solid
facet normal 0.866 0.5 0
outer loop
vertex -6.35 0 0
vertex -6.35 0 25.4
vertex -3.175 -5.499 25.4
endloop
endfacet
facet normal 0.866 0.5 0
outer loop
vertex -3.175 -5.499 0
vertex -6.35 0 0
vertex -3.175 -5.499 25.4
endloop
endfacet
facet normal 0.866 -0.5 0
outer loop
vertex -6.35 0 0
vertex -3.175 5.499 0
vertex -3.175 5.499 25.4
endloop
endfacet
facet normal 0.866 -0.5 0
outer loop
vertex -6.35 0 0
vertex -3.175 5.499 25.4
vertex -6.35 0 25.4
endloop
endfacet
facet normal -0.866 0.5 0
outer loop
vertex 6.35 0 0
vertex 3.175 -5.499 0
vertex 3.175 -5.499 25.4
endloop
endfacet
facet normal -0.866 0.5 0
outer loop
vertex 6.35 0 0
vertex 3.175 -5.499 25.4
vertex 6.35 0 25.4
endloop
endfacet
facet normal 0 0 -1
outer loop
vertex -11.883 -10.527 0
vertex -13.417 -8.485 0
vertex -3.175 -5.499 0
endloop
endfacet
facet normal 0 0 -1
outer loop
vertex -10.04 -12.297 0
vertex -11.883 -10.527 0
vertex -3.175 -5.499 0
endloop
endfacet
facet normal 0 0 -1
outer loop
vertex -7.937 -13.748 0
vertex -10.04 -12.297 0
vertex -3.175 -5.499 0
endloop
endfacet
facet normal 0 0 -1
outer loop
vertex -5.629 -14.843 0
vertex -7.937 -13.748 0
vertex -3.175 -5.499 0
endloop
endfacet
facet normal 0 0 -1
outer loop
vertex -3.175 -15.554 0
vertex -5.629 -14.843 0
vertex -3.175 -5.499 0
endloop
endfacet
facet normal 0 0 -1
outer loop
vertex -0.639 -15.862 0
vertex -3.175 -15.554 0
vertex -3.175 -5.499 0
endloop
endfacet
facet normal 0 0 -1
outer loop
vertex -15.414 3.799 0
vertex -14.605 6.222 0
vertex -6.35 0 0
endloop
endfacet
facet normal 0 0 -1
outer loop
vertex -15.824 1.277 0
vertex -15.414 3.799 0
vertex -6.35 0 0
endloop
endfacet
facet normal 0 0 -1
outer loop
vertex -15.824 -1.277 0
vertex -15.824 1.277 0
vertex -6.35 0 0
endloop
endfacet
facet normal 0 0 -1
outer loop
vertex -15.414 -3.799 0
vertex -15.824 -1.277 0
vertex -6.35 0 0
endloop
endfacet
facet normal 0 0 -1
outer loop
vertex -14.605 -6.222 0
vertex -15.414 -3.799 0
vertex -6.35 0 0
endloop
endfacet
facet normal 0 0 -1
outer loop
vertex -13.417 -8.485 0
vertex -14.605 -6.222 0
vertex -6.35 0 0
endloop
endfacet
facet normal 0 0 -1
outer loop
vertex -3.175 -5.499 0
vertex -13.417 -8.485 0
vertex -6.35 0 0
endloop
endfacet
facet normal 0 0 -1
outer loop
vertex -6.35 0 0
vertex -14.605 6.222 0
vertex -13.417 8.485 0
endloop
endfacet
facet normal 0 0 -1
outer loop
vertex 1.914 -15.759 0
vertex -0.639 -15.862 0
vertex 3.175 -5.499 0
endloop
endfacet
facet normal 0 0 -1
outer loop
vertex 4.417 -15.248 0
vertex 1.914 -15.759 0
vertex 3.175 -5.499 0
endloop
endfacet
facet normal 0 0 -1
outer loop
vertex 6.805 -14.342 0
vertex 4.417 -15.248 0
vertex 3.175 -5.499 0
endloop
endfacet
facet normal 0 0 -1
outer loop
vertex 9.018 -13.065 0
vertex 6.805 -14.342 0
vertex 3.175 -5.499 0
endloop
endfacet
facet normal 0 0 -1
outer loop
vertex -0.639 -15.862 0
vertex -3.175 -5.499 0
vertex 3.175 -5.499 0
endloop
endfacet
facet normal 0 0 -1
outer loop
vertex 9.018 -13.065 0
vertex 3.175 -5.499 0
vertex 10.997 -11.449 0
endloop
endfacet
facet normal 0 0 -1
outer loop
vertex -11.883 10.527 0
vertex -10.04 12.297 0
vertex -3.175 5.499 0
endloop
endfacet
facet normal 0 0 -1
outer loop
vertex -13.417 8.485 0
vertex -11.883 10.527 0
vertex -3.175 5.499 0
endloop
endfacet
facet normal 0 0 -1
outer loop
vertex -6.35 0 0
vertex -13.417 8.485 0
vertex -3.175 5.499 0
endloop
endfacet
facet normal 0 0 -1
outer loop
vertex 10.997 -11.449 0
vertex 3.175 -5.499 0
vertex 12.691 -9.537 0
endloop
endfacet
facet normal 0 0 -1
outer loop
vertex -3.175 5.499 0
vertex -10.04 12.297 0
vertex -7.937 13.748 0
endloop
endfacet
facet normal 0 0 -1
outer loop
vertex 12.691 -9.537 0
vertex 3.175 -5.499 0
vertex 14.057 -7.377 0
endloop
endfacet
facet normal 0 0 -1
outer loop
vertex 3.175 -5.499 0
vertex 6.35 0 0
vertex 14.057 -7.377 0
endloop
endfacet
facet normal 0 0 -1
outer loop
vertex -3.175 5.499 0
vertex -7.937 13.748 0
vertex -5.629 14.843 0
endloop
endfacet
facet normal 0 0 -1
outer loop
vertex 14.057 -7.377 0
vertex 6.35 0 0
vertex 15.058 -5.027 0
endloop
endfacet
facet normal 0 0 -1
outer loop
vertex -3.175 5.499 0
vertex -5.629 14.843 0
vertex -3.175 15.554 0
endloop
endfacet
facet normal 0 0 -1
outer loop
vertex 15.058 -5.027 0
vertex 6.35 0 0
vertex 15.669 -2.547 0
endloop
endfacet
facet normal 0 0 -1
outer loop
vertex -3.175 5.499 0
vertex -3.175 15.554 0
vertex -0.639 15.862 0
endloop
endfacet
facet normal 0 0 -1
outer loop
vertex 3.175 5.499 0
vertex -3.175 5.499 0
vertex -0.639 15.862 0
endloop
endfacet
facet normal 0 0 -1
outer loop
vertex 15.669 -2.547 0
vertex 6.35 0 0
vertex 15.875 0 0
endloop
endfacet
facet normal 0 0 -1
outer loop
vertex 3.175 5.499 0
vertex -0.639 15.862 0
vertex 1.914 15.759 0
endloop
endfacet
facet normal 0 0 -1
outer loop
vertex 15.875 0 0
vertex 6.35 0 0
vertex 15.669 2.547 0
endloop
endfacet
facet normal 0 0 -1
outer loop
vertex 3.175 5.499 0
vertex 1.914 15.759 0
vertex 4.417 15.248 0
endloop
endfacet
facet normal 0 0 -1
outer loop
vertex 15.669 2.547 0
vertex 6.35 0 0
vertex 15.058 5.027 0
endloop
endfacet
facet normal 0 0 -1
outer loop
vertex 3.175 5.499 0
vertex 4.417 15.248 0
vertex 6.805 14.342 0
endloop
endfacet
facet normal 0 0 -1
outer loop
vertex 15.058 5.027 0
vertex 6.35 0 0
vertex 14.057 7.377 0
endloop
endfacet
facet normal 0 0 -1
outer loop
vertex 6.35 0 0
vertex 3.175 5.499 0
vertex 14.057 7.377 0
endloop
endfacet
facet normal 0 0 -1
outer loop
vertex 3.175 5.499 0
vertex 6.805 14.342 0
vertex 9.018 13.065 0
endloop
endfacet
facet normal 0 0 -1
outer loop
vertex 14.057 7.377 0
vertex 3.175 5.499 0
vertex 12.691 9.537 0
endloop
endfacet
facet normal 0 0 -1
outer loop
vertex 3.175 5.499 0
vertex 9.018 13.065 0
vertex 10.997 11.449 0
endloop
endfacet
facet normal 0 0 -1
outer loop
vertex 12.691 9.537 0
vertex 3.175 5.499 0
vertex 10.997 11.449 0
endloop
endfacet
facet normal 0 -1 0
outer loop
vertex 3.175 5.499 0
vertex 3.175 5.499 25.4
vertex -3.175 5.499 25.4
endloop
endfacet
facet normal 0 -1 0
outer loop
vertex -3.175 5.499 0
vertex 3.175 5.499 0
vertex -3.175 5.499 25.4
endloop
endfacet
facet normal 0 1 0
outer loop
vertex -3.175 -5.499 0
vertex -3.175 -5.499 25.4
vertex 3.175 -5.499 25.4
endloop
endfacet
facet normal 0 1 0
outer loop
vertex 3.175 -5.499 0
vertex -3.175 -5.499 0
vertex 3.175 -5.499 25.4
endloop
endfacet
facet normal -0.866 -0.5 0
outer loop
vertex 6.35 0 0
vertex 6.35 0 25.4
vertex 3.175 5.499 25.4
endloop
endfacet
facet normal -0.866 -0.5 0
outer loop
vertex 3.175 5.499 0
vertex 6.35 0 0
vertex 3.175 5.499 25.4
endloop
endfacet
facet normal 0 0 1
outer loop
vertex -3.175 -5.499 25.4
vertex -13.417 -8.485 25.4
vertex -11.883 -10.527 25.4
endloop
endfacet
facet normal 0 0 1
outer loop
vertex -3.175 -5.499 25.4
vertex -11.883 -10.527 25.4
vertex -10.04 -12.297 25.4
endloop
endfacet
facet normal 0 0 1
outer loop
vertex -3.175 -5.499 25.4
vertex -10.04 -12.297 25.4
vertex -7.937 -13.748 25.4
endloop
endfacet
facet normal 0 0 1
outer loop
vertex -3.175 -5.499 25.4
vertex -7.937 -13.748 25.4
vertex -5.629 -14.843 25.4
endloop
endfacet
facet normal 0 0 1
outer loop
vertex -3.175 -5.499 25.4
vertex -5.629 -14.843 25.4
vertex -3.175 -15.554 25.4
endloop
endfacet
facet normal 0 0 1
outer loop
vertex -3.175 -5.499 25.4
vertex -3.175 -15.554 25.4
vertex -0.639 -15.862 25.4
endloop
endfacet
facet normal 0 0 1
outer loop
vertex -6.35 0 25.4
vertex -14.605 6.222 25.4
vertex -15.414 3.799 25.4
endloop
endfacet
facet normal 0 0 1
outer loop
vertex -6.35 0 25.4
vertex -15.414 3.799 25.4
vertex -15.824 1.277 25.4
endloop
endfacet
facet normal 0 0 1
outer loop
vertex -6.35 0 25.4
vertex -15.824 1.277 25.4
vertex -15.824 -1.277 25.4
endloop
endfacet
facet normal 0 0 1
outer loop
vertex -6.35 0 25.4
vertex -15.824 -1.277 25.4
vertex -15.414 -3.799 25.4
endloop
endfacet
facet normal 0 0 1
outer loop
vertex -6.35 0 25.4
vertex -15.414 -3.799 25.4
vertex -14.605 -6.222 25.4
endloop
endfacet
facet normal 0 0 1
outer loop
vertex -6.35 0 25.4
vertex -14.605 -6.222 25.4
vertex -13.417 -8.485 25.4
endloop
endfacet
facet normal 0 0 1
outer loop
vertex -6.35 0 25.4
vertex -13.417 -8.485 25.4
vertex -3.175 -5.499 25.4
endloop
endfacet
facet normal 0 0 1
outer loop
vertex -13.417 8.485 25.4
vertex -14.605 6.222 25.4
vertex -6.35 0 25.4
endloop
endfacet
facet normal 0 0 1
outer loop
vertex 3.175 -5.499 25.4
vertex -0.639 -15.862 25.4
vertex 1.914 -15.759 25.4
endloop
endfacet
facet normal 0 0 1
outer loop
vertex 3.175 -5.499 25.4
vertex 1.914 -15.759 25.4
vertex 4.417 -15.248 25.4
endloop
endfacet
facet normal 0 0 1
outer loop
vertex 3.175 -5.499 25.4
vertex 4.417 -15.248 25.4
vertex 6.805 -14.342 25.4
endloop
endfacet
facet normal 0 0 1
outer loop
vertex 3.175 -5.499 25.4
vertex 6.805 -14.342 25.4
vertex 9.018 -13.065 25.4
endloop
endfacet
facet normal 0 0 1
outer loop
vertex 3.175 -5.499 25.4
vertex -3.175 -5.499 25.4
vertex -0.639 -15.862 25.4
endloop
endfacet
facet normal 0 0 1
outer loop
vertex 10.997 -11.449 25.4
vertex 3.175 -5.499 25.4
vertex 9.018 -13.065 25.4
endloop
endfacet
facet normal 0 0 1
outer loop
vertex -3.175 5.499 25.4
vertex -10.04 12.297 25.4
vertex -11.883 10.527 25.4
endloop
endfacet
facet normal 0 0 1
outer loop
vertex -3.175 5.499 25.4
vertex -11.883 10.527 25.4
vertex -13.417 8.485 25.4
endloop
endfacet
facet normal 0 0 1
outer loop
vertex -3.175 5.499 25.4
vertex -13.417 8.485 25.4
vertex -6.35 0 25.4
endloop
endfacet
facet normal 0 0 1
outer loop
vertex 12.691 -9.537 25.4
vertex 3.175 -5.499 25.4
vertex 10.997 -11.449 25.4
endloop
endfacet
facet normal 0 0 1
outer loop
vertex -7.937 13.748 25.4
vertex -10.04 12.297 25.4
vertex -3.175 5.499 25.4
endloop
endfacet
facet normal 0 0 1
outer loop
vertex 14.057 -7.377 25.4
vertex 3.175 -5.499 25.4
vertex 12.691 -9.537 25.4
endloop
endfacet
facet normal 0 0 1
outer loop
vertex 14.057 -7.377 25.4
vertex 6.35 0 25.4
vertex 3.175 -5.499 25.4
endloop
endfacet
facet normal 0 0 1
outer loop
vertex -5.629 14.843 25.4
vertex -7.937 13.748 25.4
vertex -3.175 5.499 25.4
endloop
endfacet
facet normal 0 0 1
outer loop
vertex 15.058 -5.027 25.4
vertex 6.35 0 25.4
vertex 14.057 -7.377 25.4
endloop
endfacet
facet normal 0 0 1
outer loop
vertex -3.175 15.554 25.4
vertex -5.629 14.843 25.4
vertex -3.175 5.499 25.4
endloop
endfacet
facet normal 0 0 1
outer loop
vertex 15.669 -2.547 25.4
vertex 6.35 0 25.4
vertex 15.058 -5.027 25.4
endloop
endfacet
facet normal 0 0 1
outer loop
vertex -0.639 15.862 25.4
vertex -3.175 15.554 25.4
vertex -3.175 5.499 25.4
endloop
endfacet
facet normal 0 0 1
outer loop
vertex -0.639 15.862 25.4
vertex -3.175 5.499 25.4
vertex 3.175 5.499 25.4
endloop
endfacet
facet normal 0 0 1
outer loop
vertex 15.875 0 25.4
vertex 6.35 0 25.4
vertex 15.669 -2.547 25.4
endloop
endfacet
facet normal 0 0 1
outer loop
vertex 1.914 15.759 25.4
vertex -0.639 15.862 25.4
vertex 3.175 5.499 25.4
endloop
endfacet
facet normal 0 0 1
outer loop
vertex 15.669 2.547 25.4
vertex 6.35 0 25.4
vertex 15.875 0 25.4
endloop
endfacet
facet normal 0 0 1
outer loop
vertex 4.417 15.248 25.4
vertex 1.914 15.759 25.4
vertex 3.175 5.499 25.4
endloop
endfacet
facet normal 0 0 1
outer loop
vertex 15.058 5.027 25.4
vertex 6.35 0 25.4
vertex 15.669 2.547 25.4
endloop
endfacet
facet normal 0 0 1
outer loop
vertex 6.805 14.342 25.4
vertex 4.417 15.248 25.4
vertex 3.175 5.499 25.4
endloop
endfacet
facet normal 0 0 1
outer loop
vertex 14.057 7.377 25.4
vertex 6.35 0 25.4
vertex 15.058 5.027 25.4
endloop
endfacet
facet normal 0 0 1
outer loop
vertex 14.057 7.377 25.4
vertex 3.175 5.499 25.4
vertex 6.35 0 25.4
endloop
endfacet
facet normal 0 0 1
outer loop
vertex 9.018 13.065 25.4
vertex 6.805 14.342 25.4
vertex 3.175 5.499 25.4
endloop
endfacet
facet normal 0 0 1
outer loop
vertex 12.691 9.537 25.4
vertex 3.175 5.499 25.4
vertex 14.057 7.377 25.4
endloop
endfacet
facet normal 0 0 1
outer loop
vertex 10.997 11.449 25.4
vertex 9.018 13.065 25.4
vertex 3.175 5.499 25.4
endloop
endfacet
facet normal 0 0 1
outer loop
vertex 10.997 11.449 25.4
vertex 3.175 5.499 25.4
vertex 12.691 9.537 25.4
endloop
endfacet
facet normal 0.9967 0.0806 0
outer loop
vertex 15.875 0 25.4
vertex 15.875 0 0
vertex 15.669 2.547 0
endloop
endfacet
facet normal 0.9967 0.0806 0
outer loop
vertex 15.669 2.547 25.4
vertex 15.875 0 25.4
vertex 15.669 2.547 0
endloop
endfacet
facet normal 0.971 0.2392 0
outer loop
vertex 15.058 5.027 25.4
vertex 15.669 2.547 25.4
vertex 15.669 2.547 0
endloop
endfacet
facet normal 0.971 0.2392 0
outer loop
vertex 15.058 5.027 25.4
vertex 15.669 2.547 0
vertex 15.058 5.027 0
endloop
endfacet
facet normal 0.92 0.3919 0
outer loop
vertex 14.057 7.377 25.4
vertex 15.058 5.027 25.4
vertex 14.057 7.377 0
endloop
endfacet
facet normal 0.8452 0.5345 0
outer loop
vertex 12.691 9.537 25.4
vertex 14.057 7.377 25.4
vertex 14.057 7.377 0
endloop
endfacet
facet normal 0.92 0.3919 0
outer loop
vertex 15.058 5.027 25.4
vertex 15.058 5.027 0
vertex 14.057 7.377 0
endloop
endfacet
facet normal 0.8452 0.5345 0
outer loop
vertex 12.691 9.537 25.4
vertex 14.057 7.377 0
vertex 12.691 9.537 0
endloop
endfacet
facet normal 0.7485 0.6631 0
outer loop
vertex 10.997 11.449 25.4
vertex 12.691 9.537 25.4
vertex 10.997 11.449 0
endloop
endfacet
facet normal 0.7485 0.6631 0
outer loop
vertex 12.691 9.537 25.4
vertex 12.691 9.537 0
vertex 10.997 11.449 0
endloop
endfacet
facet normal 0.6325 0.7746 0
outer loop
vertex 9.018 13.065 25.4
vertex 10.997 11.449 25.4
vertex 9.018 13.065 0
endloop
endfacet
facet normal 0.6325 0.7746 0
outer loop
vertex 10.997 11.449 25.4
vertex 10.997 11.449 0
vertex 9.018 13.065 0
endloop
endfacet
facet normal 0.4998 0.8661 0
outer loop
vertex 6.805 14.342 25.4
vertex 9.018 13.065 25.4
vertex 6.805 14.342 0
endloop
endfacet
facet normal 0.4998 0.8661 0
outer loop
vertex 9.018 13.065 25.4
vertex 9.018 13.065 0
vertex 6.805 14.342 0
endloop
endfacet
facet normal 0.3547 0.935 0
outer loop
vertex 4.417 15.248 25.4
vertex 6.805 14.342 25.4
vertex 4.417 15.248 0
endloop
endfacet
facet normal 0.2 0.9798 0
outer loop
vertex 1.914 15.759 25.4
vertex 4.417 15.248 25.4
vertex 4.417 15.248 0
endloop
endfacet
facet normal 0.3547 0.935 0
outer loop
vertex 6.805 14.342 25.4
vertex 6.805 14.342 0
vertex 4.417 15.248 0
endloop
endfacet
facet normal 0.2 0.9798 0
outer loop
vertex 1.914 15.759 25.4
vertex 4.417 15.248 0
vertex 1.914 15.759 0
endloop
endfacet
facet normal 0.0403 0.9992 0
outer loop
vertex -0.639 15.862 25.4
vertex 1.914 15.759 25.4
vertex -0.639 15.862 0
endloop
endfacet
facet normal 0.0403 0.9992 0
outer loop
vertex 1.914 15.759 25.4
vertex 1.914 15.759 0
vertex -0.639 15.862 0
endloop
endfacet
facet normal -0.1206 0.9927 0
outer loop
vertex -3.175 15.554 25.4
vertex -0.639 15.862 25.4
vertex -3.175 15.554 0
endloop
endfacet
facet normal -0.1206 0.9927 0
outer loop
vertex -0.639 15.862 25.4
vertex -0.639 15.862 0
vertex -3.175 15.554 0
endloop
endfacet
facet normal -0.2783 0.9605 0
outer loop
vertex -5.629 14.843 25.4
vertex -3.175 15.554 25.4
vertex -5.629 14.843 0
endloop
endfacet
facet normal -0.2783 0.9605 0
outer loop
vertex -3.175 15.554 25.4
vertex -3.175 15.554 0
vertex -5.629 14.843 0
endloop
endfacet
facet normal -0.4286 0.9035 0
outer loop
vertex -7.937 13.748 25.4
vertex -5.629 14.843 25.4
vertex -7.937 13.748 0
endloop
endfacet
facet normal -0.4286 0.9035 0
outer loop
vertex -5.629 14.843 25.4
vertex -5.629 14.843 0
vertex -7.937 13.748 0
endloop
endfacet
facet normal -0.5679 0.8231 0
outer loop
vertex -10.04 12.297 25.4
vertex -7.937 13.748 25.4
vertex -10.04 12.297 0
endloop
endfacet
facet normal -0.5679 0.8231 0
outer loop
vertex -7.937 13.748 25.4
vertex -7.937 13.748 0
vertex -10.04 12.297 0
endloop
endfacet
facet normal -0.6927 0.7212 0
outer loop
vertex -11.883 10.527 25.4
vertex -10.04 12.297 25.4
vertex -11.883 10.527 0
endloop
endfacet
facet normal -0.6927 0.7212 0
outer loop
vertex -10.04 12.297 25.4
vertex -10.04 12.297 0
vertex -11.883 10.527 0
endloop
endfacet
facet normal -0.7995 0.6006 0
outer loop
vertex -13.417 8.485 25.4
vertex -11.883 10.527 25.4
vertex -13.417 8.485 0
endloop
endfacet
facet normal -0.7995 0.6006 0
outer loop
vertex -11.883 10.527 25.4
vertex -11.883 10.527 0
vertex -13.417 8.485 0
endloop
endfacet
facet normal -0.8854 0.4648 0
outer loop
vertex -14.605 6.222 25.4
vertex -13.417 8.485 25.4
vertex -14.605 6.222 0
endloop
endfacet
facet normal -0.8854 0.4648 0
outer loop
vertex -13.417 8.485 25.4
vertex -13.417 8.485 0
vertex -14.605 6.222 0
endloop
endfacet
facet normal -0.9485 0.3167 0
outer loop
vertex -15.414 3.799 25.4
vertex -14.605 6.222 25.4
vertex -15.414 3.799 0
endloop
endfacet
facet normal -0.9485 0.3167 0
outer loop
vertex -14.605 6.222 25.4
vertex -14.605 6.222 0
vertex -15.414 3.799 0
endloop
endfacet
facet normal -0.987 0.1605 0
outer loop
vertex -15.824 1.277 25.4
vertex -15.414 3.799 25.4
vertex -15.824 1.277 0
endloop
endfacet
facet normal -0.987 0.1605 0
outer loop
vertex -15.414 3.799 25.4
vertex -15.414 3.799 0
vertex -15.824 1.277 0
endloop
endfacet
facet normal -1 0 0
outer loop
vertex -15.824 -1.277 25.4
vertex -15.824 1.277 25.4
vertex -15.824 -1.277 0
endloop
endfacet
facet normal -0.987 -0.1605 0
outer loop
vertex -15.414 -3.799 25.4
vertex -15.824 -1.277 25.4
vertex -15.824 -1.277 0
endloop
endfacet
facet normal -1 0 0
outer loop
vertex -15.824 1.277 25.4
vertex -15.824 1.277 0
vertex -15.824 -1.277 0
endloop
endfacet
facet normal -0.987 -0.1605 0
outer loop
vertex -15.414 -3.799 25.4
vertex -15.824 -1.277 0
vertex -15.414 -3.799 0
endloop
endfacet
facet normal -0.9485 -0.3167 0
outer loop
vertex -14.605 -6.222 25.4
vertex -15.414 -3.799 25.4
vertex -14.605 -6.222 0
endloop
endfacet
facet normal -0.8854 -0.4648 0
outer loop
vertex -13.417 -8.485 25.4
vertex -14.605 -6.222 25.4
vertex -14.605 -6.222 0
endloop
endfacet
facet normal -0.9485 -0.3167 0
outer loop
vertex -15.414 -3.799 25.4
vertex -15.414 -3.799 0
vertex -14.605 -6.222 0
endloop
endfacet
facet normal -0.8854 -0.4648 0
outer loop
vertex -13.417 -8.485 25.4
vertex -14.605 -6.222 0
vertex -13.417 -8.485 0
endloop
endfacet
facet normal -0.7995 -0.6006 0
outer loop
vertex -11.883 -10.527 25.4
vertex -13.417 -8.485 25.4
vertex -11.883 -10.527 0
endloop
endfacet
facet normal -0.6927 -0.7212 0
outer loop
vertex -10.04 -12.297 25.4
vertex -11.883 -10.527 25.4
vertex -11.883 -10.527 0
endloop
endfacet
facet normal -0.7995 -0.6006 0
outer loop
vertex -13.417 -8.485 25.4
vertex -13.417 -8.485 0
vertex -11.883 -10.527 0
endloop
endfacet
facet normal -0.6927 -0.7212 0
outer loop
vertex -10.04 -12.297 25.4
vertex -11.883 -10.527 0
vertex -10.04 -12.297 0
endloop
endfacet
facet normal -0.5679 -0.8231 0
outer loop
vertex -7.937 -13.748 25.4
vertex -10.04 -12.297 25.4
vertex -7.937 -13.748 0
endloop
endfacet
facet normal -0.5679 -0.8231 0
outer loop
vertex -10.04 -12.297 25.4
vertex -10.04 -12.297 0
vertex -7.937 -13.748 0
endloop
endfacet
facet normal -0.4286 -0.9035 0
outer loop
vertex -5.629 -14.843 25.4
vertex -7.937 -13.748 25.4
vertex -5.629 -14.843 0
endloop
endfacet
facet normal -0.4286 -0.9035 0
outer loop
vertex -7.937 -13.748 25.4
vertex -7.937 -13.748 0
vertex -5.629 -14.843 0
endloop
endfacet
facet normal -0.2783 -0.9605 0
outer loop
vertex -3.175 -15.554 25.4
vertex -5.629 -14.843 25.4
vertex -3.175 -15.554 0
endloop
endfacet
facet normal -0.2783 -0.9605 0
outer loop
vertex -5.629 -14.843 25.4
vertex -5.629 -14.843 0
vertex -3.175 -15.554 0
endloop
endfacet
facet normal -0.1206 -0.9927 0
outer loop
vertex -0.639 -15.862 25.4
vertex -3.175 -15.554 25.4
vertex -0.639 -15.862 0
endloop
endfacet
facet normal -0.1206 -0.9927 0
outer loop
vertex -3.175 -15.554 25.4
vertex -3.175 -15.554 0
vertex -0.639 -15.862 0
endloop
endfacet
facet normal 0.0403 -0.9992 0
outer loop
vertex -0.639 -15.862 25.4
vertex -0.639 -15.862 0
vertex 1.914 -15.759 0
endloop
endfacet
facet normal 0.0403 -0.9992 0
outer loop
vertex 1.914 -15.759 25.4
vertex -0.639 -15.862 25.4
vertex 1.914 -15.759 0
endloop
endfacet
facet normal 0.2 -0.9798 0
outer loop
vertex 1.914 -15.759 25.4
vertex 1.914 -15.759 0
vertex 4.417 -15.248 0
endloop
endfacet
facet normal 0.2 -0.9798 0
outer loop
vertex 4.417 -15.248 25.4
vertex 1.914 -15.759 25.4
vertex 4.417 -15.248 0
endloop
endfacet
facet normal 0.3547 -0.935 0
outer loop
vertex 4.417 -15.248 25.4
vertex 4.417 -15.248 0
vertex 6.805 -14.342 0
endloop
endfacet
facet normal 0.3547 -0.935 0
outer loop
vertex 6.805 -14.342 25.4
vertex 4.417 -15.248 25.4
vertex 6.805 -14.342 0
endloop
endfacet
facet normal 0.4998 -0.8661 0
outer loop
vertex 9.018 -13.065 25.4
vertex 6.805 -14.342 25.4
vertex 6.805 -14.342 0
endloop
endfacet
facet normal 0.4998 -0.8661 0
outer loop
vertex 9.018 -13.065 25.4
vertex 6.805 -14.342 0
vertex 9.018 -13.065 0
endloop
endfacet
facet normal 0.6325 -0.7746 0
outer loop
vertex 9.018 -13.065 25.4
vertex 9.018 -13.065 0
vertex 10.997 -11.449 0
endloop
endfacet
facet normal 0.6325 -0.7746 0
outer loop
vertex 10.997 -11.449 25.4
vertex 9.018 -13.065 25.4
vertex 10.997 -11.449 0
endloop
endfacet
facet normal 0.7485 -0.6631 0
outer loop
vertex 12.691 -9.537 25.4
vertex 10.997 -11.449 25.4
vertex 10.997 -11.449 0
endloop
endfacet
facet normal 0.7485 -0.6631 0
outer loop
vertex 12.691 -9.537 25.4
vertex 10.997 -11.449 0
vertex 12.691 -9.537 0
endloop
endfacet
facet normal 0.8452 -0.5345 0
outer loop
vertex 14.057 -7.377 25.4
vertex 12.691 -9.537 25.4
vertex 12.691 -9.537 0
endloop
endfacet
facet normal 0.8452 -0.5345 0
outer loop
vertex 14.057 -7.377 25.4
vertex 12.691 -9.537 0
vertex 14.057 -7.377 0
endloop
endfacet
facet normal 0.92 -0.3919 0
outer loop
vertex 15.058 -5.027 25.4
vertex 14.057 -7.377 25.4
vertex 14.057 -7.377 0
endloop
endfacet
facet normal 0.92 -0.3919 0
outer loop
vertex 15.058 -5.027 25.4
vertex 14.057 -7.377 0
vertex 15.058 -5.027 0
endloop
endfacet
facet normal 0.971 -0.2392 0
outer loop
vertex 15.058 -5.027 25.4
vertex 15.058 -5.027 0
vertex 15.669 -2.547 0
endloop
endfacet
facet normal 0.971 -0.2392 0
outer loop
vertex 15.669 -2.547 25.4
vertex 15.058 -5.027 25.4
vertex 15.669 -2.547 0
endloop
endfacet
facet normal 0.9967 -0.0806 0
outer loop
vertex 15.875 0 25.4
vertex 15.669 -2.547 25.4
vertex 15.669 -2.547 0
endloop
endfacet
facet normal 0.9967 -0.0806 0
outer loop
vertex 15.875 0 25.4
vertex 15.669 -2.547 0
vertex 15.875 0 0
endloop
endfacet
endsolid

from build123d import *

# Parameters (mm, degrees)
SKETCH1_R           = 15.875
BOSS_EXTRUDE1_DEPTH = 25.4
CUT_EXTRUDE1_DEPTH  = 26.4


with BuildPart() as part:
    # Sketch1 → Boss-Extrude1 (new body)
    with BuildSketch(Plane.XY):
        Circle(SKETCH1_R)
    extrude(amount=BOSS_EXTRUDE1_DEPTH)

    # Sketch3 → Cut-Extrude1 (cut, through all)
    with BuildSketch(Plane.XY.offset(25.4)):
        Polygon((6.35, 0), (3.175, 5.499261314), (-3.175, 5.499261314), (-6.35, 0), (-3.175, -5.499261314), (3.175, -5.499261314), align=None)
    extrude(amount=-CUT_EXTRUDE1_DEPTH, mode=Mode.SUBTRACT)


solid = part.part
